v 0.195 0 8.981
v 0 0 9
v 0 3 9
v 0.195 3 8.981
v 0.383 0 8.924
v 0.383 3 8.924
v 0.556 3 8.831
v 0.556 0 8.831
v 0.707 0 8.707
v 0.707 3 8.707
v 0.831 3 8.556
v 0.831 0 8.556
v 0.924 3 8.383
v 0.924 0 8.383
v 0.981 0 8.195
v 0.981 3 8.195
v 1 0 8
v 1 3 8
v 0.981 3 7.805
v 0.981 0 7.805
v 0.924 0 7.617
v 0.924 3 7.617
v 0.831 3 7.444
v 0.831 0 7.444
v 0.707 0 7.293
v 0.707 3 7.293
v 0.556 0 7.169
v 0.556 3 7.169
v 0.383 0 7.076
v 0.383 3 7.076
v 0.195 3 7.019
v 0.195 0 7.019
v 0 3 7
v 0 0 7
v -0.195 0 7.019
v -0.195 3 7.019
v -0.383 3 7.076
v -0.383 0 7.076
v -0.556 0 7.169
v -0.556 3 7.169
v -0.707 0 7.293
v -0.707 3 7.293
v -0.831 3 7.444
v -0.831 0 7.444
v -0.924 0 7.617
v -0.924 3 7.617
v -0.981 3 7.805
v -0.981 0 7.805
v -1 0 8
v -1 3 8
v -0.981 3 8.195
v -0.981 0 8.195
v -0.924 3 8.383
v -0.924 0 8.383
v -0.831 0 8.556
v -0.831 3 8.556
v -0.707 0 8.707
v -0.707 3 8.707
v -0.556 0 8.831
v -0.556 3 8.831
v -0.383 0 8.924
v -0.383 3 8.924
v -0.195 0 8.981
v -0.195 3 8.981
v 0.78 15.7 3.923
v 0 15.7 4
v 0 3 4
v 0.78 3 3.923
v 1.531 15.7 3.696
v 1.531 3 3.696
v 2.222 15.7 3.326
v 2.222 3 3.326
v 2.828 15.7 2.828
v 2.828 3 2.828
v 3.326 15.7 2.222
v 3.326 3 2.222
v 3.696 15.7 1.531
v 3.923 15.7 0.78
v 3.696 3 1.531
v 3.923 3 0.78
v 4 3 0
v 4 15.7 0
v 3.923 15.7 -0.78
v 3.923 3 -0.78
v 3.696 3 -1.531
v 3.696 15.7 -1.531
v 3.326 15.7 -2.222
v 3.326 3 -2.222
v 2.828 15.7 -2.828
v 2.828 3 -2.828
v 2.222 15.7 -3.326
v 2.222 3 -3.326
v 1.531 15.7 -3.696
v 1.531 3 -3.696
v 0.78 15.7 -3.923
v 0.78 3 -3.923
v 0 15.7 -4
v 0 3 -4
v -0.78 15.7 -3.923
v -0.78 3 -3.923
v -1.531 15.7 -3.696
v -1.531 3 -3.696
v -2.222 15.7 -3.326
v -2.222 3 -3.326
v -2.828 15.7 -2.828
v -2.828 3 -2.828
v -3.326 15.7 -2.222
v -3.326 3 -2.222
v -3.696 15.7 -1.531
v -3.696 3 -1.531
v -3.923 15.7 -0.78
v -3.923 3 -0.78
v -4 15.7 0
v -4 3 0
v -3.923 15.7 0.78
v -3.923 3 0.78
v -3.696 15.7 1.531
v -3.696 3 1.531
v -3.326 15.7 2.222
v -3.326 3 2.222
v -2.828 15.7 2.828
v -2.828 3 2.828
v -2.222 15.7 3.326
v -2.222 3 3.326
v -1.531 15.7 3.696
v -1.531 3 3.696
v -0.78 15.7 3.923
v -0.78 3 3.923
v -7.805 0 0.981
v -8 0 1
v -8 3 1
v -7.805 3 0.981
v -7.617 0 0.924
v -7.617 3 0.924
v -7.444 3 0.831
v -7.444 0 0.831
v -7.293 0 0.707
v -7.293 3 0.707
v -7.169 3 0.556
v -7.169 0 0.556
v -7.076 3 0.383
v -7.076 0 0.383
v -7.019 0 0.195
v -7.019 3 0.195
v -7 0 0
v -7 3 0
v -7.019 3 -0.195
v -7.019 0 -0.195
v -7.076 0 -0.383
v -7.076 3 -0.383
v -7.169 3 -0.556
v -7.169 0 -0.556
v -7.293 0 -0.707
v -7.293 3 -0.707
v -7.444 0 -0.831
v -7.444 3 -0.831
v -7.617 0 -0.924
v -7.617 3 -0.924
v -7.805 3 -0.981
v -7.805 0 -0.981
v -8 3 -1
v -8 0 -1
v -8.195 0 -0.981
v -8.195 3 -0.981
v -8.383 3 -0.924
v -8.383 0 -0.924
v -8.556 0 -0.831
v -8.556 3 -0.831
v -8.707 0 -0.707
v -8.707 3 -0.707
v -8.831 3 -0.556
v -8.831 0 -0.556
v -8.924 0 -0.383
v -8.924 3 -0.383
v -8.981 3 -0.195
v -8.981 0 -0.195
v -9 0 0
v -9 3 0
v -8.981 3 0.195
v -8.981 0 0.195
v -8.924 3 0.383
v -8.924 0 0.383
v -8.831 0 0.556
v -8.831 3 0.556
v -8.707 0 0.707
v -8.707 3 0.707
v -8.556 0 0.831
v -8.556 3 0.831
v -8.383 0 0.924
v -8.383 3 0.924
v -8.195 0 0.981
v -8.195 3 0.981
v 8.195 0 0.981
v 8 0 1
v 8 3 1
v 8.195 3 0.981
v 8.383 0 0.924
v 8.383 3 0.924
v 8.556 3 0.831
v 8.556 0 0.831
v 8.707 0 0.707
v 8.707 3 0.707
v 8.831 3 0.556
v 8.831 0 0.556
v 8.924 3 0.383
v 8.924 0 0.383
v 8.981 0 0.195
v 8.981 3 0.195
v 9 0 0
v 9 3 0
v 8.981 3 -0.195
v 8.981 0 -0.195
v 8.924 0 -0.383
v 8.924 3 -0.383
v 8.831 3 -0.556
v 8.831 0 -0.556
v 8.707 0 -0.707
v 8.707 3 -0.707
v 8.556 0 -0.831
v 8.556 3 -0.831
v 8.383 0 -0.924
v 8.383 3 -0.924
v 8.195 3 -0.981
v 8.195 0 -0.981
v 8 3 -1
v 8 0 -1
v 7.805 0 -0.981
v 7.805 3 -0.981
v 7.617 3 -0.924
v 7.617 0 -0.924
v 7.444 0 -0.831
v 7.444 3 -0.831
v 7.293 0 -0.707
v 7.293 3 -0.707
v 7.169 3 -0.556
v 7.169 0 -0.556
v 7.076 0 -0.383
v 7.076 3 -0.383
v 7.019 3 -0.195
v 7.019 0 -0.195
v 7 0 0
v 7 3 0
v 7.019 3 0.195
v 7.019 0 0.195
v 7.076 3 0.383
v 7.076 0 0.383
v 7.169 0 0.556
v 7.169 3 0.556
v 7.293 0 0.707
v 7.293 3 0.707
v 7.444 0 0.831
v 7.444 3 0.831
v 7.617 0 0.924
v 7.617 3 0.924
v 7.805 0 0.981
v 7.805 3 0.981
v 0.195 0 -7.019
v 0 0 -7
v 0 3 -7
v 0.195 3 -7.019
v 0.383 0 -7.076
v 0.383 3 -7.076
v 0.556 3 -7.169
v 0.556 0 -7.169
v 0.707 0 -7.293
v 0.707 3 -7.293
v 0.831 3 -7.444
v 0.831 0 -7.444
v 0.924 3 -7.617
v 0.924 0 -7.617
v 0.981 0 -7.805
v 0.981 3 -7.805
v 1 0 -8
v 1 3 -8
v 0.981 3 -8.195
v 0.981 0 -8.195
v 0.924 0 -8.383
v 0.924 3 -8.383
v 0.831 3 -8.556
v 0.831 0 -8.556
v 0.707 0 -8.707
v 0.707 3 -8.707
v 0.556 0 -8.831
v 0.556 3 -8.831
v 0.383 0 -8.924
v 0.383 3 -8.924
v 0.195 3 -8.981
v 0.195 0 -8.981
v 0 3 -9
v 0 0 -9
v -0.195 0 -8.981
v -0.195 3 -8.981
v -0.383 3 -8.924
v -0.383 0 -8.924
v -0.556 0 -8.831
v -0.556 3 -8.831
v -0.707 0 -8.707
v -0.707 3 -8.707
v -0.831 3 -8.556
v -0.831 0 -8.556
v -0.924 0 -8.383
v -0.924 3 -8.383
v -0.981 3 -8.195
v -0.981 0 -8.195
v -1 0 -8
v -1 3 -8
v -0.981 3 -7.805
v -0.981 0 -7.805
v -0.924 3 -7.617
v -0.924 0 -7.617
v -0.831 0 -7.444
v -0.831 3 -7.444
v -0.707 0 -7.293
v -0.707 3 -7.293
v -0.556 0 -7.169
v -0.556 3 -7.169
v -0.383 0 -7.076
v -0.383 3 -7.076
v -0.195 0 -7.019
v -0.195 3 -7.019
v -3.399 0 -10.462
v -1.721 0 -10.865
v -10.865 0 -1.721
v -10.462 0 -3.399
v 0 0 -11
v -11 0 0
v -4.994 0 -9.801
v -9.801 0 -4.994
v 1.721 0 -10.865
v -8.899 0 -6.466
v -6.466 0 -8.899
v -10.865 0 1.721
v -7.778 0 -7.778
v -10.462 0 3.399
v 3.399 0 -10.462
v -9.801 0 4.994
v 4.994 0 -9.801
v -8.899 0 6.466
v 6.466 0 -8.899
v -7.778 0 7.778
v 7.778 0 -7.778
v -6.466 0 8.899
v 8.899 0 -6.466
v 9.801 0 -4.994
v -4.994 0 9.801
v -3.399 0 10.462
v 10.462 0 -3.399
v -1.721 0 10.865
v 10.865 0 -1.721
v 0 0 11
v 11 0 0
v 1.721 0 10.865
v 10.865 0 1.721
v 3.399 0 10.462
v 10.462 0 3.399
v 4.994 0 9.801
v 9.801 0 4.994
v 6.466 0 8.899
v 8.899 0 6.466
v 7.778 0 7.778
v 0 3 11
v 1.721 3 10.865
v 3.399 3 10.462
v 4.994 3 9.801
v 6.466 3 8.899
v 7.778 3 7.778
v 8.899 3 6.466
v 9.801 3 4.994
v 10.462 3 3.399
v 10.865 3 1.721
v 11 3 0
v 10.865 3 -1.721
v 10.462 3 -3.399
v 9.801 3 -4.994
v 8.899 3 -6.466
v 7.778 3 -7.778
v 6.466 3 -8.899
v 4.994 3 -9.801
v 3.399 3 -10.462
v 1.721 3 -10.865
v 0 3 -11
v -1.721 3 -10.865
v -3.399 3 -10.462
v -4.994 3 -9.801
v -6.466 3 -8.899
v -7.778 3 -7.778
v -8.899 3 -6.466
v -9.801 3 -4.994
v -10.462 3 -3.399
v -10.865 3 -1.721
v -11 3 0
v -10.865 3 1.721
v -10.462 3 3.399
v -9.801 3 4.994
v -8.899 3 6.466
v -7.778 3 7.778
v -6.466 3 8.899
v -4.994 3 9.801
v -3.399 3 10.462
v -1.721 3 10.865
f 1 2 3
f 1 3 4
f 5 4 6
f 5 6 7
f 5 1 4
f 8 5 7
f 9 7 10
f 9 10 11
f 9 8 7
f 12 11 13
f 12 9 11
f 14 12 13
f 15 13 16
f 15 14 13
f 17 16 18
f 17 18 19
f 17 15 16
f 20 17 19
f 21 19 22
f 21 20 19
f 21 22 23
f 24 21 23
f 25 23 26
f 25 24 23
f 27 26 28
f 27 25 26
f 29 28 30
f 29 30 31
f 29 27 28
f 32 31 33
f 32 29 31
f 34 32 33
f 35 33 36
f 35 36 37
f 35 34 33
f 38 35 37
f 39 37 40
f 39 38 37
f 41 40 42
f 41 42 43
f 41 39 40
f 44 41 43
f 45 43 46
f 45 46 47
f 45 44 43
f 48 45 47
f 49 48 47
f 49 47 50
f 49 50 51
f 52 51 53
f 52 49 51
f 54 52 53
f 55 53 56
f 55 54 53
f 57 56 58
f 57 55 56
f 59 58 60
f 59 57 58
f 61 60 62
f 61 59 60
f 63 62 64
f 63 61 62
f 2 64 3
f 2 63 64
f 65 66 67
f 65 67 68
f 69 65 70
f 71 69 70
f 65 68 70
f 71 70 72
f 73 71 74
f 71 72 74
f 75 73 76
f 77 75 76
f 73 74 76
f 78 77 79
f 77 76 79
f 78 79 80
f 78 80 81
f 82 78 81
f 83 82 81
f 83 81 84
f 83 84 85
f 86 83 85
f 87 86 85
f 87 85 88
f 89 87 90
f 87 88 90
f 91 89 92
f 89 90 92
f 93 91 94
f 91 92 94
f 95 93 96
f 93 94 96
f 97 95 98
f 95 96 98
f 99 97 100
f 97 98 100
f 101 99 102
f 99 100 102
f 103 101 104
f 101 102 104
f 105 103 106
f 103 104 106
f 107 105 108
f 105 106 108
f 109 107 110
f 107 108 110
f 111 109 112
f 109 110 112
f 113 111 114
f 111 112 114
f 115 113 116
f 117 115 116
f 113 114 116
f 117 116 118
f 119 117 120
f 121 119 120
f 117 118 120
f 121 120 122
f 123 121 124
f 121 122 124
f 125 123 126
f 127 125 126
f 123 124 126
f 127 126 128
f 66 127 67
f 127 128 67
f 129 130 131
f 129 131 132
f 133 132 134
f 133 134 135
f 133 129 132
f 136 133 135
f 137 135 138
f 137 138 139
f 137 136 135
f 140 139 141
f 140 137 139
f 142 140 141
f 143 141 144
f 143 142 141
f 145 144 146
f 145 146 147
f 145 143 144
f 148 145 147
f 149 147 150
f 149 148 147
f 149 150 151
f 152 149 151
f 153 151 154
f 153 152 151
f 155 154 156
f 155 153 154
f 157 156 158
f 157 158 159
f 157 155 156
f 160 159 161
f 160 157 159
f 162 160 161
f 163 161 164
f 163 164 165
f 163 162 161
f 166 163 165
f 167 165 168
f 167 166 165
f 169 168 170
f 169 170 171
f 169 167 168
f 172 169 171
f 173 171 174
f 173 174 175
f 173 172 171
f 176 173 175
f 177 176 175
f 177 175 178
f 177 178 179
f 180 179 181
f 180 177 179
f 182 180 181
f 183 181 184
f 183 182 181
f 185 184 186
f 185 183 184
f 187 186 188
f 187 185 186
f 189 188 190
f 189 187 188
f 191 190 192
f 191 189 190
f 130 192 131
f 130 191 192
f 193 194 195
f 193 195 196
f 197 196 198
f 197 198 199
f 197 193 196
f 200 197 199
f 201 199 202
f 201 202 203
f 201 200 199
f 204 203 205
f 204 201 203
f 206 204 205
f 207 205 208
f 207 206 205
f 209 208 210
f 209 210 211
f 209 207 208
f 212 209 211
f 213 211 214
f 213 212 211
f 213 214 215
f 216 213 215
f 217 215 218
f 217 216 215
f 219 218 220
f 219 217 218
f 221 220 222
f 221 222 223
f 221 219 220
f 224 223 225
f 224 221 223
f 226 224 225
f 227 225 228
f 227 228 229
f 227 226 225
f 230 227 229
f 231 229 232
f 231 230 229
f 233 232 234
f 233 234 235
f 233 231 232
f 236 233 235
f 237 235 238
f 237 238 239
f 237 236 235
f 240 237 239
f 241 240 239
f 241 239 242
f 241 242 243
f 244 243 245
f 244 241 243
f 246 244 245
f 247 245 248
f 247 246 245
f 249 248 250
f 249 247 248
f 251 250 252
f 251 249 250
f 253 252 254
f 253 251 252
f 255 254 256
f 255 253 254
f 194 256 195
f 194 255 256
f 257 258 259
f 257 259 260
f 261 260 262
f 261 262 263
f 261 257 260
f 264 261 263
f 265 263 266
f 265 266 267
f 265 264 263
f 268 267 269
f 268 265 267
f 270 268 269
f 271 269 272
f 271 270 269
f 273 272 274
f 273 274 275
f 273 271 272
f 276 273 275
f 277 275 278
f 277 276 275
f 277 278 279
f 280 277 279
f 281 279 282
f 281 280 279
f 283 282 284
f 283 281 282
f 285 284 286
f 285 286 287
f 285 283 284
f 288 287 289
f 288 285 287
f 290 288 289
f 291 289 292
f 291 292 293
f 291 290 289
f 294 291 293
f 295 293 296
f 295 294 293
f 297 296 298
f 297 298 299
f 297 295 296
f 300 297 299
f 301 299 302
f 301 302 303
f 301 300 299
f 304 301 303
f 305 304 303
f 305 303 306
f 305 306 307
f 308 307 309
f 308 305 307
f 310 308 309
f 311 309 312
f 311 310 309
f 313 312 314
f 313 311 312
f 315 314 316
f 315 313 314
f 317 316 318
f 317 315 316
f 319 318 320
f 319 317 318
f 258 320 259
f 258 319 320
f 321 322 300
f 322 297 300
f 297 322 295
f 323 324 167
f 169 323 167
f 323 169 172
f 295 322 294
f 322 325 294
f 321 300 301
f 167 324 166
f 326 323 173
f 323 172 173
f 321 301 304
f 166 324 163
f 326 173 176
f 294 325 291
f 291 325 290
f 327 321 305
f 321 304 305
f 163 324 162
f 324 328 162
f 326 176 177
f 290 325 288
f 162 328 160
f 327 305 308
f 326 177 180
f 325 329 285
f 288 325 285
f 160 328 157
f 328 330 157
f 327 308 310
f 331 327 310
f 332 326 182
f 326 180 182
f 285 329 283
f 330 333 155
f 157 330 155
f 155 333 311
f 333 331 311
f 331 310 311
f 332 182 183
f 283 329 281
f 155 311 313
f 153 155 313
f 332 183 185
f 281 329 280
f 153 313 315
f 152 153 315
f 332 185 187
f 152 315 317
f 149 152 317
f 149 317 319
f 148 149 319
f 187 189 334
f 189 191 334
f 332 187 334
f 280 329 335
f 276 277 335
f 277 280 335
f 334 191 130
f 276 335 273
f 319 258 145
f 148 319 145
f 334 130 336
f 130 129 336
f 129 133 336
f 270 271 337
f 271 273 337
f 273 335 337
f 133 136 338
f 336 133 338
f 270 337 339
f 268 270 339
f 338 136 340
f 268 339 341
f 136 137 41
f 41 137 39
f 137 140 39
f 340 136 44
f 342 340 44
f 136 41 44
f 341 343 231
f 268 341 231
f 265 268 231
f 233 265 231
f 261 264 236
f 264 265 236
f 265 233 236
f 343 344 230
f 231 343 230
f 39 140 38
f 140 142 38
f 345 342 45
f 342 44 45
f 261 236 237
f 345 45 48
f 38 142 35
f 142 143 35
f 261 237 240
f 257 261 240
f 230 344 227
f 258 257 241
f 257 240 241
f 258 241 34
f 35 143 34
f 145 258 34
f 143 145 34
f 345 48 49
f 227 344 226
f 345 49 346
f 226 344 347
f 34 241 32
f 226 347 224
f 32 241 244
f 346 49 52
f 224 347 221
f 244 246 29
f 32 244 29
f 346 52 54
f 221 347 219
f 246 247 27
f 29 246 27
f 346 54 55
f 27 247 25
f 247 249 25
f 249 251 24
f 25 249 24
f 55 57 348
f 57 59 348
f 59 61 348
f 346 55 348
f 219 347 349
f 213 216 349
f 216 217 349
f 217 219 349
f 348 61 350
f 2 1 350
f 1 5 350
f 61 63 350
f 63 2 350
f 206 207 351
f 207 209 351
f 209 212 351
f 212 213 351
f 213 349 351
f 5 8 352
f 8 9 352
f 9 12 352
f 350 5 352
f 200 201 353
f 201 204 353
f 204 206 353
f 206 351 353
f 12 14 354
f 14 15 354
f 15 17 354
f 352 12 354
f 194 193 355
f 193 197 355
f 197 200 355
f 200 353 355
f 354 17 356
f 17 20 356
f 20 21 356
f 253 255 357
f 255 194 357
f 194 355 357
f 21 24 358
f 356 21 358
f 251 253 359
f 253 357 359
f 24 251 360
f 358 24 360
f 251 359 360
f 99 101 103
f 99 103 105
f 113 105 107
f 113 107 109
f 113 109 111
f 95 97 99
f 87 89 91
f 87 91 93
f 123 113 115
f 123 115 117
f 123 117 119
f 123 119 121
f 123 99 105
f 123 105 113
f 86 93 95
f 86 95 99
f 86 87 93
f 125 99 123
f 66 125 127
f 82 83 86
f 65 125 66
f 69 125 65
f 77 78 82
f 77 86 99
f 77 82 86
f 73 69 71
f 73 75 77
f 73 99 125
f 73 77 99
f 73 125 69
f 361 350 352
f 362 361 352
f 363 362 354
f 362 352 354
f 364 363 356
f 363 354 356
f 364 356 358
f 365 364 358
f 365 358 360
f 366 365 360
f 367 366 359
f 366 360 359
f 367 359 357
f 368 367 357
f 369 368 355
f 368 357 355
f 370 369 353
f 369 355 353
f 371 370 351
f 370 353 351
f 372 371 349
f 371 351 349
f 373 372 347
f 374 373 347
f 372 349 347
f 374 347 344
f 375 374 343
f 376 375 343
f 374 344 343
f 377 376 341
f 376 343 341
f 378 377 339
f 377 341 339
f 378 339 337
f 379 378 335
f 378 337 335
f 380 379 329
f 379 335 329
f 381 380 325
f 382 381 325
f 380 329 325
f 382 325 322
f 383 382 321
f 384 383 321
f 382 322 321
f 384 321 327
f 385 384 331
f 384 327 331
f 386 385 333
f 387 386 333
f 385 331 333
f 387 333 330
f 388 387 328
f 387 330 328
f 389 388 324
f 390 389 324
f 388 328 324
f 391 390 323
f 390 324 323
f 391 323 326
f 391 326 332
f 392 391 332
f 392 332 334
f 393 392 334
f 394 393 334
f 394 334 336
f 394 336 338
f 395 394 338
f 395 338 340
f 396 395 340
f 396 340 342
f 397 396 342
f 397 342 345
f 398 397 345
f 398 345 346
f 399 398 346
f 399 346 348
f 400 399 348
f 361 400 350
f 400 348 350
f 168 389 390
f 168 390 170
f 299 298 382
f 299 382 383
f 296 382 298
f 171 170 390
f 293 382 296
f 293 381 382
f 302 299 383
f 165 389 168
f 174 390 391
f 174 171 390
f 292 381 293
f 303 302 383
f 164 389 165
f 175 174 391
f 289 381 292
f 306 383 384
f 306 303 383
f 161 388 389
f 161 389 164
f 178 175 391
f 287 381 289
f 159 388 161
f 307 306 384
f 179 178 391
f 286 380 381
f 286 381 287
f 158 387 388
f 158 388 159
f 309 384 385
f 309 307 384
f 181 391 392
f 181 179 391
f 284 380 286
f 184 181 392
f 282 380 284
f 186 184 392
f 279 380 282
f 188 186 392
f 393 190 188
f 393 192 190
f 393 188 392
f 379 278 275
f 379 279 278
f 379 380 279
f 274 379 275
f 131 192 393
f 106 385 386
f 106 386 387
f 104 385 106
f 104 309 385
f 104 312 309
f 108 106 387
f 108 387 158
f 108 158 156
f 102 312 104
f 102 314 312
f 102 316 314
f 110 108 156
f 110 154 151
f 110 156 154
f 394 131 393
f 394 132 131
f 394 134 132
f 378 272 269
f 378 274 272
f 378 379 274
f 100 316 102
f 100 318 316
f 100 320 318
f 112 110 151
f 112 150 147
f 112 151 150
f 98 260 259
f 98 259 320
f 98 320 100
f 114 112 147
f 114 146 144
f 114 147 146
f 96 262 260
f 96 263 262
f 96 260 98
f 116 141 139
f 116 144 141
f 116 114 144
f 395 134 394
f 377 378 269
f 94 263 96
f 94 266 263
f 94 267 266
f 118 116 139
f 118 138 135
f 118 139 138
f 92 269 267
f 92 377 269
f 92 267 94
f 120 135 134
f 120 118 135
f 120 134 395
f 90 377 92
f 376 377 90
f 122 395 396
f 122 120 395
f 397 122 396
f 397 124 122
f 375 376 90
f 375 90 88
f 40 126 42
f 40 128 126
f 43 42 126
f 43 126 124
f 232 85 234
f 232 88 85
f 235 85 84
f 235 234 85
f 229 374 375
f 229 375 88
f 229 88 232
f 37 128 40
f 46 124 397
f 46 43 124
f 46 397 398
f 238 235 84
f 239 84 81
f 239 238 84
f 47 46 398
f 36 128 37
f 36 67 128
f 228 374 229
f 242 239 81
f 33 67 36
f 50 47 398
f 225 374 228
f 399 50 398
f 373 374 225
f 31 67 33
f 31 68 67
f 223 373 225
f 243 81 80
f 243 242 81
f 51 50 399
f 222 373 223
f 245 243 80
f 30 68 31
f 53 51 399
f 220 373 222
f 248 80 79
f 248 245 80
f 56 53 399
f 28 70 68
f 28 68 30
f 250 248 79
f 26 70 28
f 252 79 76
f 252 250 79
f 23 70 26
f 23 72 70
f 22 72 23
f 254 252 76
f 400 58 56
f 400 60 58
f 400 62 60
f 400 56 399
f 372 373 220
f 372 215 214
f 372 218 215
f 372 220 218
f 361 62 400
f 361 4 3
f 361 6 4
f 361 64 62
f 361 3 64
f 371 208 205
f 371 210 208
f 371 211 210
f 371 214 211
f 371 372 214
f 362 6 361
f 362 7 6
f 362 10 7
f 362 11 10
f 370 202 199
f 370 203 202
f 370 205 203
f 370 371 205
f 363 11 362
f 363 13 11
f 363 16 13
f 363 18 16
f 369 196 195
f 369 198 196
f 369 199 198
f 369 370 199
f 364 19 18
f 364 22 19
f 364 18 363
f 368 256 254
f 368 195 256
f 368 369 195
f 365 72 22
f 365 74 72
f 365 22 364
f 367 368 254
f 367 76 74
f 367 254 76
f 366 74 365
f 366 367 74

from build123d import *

# Parameters (mm, degrees)
SKETCH1_R           = 11
SKETCH1_R_2         = 1
BOSS_EXTRUDE1_DEPTH = 3
SKETCH2_R           = 4
BOSS_EXTRUDE2_DEPTH = 12.7


with BuildPart() as part:
    # Sketch1 → Boss-Extrude1 (new body)
    with BuildSketch(Plane(origin=(0, 0, 0), x_dir=(1, 0, 0), z_dir=(0, 1, 0))):
        with Locations(Location((0, 0, 0), (0, 0, 270))):
            Circle(SKETCH1_R)
        with Locations(Location((0, 8, 0), (0, 0, 270))):
            Circle(SKETCH1_R_2, mode=Mode.SUBTRACT)
        with Locations(Location((8, 0, 0), (0, 0, 270))):
            Circle(SKETCH1_R_2, mode=Mode.SUBTRACT)
        with Locations(Location((0, -8, 0), (0, 0, 270))):
            Circle(SKETCH1_R_2, mode=Mode.SUBTRACT)
        with Locations(Location((-8, 0, 0), (0, 0, 270))):
            Circle(SKETCH1_R_2, mode=Mode.SUBTRACT)
    extrude(amount=BOSS_EXTRUDE1_DEPTH)

    # Sketch2 → Boss-Extrude2 (add)
    with BuildSketch(Plane(origin=(0, 3, 0), x_dir=(1, 0, 0), z_dir=(0, 1, 0))):
        with Locations(Location((0, 0, 0), (0, 0, 270))):
            Circle(SKETCH2_R)
    extrude(amount=BOSS_EXTRUDE2_DEPTH)


solid = part.part
